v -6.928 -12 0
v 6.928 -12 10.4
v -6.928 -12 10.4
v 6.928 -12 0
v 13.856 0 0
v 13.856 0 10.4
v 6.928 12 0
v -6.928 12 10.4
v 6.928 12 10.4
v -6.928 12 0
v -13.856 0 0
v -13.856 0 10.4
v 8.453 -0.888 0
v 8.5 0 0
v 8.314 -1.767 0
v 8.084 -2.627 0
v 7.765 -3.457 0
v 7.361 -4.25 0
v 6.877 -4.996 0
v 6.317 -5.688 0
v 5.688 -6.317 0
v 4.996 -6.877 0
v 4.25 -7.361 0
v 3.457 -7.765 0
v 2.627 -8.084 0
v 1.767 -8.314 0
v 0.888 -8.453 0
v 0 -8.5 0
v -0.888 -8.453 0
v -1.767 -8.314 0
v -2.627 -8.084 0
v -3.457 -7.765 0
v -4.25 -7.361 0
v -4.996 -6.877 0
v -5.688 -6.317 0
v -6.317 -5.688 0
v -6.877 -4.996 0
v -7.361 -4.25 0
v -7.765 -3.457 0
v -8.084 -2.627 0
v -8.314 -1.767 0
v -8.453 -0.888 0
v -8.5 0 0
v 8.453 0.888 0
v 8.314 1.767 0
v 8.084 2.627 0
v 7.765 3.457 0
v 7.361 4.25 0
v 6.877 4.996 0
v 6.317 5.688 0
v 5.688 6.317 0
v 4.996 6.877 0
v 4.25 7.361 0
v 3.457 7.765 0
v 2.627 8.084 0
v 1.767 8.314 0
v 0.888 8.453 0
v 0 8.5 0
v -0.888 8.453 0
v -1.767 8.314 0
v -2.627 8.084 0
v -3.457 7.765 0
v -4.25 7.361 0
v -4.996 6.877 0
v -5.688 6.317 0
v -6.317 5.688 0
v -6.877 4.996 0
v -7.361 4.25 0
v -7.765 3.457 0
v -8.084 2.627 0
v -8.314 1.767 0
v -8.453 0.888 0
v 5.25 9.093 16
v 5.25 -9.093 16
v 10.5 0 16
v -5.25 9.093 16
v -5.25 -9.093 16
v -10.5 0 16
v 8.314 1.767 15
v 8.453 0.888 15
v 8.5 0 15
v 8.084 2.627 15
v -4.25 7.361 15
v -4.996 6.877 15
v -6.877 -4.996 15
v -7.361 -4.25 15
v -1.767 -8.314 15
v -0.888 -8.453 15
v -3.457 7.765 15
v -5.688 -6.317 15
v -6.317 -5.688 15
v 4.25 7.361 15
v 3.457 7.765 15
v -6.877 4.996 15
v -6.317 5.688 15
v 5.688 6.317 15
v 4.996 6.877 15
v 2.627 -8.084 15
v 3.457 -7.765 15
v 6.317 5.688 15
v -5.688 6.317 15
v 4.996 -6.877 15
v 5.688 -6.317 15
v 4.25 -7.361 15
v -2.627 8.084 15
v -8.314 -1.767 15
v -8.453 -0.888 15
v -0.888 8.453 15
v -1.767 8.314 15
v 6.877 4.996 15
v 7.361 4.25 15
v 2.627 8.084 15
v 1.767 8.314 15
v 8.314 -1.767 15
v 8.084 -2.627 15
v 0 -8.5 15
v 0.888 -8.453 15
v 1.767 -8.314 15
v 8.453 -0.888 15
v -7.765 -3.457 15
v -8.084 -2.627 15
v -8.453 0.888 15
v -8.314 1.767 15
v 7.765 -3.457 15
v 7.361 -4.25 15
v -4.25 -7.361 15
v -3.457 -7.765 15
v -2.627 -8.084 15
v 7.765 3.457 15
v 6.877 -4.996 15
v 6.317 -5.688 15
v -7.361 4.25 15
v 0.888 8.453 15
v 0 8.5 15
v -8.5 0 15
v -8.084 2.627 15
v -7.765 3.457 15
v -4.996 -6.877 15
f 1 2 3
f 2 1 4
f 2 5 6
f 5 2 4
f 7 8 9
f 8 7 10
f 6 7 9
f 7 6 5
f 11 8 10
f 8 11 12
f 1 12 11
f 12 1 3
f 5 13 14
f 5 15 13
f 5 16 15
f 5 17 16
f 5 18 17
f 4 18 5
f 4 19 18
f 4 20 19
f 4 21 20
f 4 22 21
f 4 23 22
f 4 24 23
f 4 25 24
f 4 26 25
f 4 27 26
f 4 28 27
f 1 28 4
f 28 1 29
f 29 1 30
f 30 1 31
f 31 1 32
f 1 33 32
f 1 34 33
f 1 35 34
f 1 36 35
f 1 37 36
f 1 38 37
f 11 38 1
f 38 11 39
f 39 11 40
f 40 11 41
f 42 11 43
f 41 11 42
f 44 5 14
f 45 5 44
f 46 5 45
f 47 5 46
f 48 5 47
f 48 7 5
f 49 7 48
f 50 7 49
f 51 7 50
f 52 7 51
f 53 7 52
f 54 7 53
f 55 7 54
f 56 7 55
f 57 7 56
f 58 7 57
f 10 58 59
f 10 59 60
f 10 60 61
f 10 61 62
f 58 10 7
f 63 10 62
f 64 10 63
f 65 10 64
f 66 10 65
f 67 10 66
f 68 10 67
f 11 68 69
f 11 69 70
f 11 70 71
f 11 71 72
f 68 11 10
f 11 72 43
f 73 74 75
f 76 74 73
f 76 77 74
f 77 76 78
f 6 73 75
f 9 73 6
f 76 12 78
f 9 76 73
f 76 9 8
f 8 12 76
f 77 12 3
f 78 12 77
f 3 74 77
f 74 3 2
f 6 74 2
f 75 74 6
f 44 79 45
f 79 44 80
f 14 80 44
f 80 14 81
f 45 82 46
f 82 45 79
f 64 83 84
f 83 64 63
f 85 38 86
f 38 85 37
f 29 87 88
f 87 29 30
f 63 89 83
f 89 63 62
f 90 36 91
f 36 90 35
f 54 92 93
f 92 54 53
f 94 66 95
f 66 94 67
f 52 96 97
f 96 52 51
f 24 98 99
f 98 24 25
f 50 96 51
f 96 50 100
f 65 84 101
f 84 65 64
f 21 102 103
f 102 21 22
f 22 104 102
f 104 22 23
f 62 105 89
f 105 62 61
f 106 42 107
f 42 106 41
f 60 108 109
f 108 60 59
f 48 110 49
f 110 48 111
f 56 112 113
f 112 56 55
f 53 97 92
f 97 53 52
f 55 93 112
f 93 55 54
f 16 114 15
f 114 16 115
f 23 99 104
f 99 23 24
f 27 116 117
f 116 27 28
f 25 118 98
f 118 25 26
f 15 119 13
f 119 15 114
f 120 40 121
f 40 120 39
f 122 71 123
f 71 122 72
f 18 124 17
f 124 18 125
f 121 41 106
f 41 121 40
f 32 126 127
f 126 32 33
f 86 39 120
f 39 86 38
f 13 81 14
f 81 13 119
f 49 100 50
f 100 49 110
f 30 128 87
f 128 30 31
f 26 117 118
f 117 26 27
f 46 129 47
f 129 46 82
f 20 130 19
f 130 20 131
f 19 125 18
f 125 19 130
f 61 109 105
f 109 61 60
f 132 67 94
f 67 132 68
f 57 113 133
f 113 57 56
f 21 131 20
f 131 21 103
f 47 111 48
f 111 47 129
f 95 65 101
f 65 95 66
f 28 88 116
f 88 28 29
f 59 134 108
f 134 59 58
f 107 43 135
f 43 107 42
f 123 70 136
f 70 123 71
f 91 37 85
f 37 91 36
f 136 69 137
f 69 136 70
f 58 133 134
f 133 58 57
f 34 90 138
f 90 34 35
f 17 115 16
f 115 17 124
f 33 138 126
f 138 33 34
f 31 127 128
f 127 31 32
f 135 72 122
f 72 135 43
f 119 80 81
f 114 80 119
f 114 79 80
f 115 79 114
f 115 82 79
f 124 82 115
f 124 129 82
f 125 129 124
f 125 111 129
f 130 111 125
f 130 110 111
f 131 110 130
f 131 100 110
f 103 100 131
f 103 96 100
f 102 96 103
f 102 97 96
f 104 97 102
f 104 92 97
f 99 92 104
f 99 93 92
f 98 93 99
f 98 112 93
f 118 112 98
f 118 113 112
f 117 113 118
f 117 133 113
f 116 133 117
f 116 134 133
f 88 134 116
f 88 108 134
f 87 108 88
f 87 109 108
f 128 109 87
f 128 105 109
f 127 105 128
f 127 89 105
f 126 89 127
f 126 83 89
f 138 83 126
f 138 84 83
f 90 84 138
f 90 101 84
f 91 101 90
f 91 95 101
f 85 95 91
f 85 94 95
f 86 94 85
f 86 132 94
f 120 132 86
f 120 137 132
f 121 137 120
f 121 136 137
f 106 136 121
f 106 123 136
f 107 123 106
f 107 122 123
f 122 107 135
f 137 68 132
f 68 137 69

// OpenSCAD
// Blind cap nut.
$fn = 60;
eps = 0.02;
thread_d = 17;
flat = 24;
height = 16;
body_h = height*0.65;
difference() {
    union() {
        cylinder(d=flat/cos(30),h=body_h,$fn=6);
        translate([0,0,body_h]) cylinder(d1=flat/cos(30),d2=thread_d+4,h=height-body_h,$fn=6);
    }
    translate([0,0,-eps]) cylinder(d=thread_d,h=height-1+eps);
}
